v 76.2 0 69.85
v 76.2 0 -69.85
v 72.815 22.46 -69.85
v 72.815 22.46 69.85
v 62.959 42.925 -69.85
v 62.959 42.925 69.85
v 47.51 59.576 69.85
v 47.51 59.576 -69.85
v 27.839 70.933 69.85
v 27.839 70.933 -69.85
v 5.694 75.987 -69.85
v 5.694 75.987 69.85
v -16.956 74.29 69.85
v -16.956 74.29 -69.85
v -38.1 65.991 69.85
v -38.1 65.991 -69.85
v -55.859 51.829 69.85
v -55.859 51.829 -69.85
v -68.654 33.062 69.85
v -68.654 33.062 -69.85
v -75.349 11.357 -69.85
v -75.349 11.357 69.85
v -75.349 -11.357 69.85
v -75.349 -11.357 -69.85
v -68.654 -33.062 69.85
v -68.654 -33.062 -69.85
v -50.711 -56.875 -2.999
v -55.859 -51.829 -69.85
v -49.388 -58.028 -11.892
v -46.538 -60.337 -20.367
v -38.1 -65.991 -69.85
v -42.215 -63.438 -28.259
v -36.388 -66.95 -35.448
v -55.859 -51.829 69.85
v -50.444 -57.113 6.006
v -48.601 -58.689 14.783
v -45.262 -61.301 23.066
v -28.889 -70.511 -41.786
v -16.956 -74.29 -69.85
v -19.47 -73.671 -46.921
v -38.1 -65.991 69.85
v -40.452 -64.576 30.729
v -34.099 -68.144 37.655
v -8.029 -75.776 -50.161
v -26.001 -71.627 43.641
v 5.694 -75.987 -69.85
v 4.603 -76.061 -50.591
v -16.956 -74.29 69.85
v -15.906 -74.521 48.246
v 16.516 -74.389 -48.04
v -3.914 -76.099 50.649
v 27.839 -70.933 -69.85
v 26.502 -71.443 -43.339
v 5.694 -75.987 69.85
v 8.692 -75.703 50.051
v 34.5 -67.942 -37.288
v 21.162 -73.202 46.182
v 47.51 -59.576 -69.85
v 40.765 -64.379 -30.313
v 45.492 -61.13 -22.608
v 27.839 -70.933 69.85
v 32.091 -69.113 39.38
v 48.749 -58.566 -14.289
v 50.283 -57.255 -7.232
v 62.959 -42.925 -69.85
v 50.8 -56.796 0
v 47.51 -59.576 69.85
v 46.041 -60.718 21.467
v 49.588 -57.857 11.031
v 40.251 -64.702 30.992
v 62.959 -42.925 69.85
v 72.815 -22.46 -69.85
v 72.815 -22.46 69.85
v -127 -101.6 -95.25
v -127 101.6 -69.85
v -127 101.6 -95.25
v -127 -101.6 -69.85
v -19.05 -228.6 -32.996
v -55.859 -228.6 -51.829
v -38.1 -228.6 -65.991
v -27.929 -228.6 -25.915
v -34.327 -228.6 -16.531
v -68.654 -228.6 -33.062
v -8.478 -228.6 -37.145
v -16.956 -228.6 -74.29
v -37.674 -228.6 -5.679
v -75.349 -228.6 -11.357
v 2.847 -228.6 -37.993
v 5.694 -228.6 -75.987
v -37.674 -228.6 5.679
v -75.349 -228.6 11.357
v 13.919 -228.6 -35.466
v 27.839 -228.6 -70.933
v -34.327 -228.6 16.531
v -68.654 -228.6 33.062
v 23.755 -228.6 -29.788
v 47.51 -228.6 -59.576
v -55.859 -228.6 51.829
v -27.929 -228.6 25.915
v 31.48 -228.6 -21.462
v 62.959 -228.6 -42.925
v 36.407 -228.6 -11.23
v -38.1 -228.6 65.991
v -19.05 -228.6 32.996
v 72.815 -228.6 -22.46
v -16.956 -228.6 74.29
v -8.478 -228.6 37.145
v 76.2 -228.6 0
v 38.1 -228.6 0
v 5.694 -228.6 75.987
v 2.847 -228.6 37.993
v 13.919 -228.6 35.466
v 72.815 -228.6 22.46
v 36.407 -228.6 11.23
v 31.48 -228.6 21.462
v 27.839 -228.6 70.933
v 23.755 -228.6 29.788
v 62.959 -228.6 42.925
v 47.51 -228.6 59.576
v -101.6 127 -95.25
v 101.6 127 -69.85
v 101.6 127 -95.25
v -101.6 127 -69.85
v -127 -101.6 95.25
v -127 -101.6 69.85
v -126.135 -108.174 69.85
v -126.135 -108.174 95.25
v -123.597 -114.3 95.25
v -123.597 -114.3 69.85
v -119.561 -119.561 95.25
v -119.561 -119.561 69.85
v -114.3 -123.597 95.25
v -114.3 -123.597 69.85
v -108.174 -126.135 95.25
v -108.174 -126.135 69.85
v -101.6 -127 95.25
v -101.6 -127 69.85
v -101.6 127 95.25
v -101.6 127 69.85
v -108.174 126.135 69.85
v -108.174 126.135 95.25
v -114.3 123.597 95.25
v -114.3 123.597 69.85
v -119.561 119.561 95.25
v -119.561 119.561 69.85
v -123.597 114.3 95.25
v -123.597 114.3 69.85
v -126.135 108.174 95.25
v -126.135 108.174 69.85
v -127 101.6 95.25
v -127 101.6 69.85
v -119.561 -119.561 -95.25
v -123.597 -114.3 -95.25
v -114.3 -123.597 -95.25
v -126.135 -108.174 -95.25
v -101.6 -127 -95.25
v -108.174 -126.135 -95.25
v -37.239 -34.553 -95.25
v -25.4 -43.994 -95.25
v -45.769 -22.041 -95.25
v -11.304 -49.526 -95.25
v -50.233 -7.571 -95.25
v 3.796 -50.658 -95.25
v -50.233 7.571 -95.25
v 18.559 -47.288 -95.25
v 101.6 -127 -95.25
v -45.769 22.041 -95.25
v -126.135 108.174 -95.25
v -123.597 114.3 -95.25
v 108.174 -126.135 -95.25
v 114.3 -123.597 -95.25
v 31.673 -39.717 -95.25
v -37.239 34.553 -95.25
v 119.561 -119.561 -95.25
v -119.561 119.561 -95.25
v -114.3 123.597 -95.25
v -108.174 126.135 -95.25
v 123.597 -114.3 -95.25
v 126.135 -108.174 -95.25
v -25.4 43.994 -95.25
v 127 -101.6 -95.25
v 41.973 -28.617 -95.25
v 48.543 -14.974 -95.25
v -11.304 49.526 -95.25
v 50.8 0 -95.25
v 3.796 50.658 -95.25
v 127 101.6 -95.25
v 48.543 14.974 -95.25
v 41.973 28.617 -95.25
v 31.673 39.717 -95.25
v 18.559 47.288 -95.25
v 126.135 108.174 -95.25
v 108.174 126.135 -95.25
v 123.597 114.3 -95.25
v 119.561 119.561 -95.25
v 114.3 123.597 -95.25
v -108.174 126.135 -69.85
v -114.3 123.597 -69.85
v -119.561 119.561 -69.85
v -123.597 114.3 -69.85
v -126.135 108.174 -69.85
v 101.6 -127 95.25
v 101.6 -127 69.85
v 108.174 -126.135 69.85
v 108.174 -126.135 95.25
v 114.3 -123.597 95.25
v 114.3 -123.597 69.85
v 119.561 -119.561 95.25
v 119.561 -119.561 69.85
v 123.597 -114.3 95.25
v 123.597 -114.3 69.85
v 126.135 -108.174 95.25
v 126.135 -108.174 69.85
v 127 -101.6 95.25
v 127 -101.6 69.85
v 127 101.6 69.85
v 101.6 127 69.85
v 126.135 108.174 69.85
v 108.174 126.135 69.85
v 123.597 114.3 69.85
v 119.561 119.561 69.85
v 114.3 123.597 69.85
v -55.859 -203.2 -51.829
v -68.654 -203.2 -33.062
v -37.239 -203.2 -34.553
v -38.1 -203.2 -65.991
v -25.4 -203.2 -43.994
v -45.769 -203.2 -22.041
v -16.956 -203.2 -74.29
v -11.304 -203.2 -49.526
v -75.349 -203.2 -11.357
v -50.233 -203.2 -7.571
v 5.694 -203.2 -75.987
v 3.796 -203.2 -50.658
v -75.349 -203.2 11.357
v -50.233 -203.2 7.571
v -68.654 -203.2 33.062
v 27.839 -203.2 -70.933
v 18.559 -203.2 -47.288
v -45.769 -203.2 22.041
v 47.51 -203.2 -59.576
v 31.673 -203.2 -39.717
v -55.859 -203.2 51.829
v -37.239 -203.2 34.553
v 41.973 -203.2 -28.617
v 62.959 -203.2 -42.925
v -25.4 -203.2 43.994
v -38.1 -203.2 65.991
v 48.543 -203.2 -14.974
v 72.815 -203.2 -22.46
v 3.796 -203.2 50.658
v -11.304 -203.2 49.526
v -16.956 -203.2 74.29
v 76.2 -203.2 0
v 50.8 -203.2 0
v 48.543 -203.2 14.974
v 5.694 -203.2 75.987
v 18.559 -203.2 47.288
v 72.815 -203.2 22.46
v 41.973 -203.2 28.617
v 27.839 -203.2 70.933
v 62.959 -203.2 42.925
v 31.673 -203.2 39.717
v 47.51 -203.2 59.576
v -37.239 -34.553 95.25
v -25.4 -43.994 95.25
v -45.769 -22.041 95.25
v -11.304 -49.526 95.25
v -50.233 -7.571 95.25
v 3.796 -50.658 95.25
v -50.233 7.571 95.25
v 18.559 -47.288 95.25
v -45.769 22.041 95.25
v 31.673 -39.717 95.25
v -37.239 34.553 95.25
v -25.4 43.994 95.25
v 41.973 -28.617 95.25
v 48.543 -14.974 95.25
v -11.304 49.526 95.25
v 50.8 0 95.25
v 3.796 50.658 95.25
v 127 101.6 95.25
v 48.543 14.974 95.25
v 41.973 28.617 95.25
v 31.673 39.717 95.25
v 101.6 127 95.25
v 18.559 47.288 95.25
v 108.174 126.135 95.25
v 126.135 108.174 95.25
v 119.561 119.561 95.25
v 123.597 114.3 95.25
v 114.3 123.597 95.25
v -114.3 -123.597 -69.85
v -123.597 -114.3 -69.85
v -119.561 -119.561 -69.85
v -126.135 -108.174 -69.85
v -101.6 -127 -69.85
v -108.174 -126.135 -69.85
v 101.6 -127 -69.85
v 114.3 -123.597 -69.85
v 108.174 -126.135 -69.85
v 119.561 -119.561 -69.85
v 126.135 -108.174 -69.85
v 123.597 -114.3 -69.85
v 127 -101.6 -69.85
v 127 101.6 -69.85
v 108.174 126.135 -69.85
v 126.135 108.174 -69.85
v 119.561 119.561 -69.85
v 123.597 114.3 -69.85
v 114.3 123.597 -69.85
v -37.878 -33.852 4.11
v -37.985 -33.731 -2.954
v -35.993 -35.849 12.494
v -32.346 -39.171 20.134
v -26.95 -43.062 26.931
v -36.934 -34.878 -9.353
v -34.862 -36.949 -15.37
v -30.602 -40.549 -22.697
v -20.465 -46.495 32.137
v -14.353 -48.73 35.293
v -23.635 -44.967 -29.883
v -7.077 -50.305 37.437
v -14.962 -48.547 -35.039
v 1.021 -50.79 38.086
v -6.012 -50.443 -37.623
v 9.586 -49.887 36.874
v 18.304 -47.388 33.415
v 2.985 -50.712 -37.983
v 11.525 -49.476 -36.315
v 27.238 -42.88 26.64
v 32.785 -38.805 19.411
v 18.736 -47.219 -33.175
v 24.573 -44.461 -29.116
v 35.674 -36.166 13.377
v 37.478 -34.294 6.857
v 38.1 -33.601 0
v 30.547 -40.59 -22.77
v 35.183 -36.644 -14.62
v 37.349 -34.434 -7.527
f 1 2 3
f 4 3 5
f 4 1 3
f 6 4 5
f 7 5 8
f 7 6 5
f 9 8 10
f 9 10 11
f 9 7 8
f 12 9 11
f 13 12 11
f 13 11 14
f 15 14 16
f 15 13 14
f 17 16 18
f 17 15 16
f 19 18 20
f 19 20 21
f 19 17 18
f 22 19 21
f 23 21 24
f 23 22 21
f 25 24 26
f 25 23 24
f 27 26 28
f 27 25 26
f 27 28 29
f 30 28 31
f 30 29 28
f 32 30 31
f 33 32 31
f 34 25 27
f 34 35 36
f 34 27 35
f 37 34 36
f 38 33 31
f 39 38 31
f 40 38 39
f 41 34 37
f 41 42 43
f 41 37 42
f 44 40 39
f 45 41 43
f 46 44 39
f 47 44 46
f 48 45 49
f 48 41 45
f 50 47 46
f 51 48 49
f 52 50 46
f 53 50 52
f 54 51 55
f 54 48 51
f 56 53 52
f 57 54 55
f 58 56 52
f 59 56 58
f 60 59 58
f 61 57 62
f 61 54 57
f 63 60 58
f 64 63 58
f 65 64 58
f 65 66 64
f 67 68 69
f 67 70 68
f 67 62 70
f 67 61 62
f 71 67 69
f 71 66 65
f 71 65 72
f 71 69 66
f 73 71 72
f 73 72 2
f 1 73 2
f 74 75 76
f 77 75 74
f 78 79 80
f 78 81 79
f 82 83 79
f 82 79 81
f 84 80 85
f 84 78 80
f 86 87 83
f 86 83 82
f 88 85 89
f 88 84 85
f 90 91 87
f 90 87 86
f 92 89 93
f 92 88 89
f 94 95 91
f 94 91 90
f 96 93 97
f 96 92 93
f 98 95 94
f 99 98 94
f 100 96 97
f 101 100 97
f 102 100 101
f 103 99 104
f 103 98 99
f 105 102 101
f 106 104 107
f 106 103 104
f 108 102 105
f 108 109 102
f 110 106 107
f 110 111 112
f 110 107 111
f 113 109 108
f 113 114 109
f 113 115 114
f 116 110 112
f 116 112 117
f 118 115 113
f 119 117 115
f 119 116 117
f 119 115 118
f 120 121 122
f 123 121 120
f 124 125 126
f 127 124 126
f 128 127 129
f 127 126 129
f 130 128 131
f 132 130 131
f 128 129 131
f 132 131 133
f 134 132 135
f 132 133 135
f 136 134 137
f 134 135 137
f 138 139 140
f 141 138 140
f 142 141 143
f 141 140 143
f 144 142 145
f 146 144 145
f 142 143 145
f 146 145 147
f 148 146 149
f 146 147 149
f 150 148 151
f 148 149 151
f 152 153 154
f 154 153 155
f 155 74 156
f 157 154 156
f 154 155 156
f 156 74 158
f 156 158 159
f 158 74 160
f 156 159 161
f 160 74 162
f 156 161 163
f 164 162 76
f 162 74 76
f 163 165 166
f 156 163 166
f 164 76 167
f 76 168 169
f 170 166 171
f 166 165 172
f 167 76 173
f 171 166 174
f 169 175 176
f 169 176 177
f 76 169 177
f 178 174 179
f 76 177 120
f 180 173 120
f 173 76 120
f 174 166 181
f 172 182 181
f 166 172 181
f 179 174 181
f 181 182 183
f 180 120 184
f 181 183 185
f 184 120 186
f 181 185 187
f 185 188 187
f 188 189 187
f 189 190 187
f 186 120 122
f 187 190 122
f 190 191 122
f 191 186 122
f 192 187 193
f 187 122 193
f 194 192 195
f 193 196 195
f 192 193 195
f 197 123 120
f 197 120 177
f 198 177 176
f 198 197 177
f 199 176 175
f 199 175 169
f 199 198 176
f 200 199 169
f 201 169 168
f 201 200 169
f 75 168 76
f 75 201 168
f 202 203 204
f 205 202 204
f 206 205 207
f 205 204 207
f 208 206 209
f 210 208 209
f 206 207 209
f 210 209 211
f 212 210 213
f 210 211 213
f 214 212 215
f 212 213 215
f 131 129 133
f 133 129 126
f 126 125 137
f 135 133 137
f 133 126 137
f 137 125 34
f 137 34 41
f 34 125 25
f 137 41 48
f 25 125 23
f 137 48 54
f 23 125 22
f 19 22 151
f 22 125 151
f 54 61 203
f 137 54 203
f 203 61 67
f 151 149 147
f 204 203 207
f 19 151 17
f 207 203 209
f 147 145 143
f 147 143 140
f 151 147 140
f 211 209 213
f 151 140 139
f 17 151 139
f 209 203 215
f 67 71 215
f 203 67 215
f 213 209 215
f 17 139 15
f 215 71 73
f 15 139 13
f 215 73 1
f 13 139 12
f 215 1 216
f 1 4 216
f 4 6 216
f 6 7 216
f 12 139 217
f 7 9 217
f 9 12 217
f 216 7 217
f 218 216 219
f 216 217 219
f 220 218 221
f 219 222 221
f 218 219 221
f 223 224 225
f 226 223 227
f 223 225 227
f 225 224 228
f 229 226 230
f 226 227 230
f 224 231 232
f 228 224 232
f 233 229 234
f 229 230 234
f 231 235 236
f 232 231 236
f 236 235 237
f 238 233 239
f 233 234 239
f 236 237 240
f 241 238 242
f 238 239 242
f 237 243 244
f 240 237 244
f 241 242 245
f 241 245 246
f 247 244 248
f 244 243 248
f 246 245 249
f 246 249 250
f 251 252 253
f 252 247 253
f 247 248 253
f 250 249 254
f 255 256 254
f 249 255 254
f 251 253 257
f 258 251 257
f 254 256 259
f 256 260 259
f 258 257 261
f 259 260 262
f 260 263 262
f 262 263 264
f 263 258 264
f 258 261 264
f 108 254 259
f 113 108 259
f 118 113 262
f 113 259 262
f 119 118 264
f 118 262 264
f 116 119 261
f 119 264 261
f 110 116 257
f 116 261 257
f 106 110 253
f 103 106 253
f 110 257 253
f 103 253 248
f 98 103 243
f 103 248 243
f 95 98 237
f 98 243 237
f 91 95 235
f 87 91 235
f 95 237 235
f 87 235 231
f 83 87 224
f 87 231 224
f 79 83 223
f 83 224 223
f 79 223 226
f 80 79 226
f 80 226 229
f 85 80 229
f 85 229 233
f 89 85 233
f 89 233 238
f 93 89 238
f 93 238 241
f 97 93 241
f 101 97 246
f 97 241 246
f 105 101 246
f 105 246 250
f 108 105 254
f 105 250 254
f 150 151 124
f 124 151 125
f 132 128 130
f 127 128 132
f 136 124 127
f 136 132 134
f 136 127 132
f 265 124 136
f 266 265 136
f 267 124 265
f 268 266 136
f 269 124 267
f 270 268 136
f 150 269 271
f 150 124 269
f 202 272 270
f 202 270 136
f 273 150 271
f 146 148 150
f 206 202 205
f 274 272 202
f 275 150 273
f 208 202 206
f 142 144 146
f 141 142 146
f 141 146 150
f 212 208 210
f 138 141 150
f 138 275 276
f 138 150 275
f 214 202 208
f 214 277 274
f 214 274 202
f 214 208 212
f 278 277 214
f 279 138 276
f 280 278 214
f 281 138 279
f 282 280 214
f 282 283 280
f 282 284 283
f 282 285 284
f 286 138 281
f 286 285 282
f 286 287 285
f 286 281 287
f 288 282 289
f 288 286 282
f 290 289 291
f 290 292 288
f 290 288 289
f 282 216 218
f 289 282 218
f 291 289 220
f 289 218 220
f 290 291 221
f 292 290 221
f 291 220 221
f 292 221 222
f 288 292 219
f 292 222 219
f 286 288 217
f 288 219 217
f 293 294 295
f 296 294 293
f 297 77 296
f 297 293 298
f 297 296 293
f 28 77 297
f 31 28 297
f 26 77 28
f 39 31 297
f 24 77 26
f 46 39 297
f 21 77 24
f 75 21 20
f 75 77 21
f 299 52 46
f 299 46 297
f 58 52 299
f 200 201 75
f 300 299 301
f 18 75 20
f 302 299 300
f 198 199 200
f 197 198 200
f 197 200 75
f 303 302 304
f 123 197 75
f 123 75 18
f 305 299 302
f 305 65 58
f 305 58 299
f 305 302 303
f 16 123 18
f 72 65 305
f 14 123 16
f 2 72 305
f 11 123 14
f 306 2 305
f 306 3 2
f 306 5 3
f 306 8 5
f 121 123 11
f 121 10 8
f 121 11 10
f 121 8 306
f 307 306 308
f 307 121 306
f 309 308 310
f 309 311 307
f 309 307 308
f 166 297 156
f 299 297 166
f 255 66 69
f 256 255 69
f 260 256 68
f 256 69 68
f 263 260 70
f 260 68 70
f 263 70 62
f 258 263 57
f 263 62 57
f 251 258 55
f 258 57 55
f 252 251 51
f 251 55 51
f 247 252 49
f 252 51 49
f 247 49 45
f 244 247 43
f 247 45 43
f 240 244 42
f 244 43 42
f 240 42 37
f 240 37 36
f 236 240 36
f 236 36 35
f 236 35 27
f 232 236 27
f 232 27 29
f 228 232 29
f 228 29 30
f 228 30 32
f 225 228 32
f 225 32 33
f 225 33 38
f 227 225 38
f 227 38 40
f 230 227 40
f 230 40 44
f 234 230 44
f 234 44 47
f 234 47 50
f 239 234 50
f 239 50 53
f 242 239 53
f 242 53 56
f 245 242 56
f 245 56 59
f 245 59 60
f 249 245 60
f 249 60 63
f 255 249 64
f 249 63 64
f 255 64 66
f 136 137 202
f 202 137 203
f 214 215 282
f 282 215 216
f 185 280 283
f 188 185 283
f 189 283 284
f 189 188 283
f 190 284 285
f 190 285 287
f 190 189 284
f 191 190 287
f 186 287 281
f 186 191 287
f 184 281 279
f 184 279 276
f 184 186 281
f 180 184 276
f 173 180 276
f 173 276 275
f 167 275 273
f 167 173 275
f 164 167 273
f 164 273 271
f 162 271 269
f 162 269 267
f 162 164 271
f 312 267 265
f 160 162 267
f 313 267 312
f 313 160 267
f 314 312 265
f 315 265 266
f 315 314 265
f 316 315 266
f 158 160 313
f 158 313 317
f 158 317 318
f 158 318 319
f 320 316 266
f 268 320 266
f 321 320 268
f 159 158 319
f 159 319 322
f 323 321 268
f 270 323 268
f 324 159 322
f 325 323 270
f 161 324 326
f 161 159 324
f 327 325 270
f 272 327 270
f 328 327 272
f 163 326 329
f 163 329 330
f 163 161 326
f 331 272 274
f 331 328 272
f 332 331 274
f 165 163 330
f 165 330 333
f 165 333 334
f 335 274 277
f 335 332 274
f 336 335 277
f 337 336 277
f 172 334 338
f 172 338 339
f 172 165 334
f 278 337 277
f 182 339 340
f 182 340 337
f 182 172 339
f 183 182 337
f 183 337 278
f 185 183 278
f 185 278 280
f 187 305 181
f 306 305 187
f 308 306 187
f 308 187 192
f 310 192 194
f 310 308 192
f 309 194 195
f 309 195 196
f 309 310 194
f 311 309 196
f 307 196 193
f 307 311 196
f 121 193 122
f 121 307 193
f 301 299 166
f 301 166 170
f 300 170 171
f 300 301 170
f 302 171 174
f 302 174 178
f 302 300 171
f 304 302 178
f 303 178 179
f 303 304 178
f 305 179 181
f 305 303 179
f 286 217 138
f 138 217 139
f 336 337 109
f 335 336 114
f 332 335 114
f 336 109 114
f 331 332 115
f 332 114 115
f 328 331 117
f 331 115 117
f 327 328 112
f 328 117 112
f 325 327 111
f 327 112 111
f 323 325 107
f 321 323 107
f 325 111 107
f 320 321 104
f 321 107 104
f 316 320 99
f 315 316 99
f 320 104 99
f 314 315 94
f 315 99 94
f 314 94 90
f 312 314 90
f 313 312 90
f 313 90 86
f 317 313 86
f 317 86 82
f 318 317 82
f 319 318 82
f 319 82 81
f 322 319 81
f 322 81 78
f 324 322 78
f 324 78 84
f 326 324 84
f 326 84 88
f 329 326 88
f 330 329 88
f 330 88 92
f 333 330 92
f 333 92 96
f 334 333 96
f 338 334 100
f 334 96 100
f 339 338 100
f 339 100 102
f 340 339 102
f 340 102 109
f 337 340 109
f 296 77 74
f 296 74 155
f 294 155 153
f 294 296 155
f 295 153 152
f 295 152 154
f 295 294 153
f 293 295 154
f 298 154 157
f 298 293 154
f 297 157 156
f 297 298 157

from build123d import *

# Parameters (mm, degrees)
F0_R      = 76.2
F0_R_2    = 50.8
F1_DEPTH  = 69.85
F2_R      = 50.8
F3_DEPTH  = 25.4
F5_R      = 50.8
F6_DEPTH  = 203.2
F7_R      = 76.2
F8_DEPTH  = 25.4
F10_DEPTH = 69.85
F9_R      = 38.1
F11_DEPTH = 203.2


with BuildPart() as f1:
    # F0 (on Top) → F1 (new body, symmetric)
    with BuildSketch(Plane.XY):
        Circle(F0_R)
        Circle(F0_R_2, mode=Mode.SUBTRACT)
    extrude(amount=F1_DEPTH, both=True)

    # F2 (on face) → F3 (join)
    with BuildSketch(Plane.XY.offset(69.85)):
        with BuildLine():
            Line((101.6, 127), (0, 127))
            Line((0, 127), (-101.6, 127))
            ThreePointArc((-101.6, 127), (-119.5605122421, 119.5605122421), (-127, 101.6))
            Line((-127, 101.6), (-127, 0))
            Line((-127, 0), (-127, -101.6))
            ThreePointArc((-127, -101.6), (-119.5605122421, -119.5605122421), (-101.6, -127))
            Line((-101.6, -127), (0, -127))
            Line((0, -127), (101.6, -127))
            ThreePointArc((101.6, -127), (119.5605122421, -119.5605122421), (127, -101.6))
            Line((127, -101.6), (127, 0))
            Line((127, 0), (127, 101.6))
            ThreePointArc((127, 101.6), (119.5605122421, 119.5605122421), (101.6, 127))
        make_face()
        Circle(F2_R, mode=Mode.SUBTRACT)
    extrude(amount=F3_DEPTH)

    # F4: F1 across plane


with BuildPart() as f1_1:
    add(f1.part)
    add(f1.part.mirror(Plane.XY))

    # F5 (on Front) → F6 (join)
    with BuildSketch(Plane.XZ):
        Circle(F5_R)
    extrude(amount=F6_DEPTH)

    # F7 (on face) → F8 (join)
    with BuildSketch(Plane.XZ.offset(203.2)):
        Circle(F7_R)
    extrude(amount=F8_DEPTH)

    # F0 (on Top) → F10 (cut, symmetric)
    with BuildSketch(Plane.XY):
        Circle(F0_R_2)
    extrude(amount=F10_DEPTH, both=True, mode=Mode.SUBTRACT)

    # F9 (on face) → F11 (cut)
    with BuildSketch(Plane.XZ.offset(228.6)):
        Circle(F9_R)
    extrude(amount=-F11_DEPTH, mode=Mode.SUBTRACT)


solid = f1_1.part
